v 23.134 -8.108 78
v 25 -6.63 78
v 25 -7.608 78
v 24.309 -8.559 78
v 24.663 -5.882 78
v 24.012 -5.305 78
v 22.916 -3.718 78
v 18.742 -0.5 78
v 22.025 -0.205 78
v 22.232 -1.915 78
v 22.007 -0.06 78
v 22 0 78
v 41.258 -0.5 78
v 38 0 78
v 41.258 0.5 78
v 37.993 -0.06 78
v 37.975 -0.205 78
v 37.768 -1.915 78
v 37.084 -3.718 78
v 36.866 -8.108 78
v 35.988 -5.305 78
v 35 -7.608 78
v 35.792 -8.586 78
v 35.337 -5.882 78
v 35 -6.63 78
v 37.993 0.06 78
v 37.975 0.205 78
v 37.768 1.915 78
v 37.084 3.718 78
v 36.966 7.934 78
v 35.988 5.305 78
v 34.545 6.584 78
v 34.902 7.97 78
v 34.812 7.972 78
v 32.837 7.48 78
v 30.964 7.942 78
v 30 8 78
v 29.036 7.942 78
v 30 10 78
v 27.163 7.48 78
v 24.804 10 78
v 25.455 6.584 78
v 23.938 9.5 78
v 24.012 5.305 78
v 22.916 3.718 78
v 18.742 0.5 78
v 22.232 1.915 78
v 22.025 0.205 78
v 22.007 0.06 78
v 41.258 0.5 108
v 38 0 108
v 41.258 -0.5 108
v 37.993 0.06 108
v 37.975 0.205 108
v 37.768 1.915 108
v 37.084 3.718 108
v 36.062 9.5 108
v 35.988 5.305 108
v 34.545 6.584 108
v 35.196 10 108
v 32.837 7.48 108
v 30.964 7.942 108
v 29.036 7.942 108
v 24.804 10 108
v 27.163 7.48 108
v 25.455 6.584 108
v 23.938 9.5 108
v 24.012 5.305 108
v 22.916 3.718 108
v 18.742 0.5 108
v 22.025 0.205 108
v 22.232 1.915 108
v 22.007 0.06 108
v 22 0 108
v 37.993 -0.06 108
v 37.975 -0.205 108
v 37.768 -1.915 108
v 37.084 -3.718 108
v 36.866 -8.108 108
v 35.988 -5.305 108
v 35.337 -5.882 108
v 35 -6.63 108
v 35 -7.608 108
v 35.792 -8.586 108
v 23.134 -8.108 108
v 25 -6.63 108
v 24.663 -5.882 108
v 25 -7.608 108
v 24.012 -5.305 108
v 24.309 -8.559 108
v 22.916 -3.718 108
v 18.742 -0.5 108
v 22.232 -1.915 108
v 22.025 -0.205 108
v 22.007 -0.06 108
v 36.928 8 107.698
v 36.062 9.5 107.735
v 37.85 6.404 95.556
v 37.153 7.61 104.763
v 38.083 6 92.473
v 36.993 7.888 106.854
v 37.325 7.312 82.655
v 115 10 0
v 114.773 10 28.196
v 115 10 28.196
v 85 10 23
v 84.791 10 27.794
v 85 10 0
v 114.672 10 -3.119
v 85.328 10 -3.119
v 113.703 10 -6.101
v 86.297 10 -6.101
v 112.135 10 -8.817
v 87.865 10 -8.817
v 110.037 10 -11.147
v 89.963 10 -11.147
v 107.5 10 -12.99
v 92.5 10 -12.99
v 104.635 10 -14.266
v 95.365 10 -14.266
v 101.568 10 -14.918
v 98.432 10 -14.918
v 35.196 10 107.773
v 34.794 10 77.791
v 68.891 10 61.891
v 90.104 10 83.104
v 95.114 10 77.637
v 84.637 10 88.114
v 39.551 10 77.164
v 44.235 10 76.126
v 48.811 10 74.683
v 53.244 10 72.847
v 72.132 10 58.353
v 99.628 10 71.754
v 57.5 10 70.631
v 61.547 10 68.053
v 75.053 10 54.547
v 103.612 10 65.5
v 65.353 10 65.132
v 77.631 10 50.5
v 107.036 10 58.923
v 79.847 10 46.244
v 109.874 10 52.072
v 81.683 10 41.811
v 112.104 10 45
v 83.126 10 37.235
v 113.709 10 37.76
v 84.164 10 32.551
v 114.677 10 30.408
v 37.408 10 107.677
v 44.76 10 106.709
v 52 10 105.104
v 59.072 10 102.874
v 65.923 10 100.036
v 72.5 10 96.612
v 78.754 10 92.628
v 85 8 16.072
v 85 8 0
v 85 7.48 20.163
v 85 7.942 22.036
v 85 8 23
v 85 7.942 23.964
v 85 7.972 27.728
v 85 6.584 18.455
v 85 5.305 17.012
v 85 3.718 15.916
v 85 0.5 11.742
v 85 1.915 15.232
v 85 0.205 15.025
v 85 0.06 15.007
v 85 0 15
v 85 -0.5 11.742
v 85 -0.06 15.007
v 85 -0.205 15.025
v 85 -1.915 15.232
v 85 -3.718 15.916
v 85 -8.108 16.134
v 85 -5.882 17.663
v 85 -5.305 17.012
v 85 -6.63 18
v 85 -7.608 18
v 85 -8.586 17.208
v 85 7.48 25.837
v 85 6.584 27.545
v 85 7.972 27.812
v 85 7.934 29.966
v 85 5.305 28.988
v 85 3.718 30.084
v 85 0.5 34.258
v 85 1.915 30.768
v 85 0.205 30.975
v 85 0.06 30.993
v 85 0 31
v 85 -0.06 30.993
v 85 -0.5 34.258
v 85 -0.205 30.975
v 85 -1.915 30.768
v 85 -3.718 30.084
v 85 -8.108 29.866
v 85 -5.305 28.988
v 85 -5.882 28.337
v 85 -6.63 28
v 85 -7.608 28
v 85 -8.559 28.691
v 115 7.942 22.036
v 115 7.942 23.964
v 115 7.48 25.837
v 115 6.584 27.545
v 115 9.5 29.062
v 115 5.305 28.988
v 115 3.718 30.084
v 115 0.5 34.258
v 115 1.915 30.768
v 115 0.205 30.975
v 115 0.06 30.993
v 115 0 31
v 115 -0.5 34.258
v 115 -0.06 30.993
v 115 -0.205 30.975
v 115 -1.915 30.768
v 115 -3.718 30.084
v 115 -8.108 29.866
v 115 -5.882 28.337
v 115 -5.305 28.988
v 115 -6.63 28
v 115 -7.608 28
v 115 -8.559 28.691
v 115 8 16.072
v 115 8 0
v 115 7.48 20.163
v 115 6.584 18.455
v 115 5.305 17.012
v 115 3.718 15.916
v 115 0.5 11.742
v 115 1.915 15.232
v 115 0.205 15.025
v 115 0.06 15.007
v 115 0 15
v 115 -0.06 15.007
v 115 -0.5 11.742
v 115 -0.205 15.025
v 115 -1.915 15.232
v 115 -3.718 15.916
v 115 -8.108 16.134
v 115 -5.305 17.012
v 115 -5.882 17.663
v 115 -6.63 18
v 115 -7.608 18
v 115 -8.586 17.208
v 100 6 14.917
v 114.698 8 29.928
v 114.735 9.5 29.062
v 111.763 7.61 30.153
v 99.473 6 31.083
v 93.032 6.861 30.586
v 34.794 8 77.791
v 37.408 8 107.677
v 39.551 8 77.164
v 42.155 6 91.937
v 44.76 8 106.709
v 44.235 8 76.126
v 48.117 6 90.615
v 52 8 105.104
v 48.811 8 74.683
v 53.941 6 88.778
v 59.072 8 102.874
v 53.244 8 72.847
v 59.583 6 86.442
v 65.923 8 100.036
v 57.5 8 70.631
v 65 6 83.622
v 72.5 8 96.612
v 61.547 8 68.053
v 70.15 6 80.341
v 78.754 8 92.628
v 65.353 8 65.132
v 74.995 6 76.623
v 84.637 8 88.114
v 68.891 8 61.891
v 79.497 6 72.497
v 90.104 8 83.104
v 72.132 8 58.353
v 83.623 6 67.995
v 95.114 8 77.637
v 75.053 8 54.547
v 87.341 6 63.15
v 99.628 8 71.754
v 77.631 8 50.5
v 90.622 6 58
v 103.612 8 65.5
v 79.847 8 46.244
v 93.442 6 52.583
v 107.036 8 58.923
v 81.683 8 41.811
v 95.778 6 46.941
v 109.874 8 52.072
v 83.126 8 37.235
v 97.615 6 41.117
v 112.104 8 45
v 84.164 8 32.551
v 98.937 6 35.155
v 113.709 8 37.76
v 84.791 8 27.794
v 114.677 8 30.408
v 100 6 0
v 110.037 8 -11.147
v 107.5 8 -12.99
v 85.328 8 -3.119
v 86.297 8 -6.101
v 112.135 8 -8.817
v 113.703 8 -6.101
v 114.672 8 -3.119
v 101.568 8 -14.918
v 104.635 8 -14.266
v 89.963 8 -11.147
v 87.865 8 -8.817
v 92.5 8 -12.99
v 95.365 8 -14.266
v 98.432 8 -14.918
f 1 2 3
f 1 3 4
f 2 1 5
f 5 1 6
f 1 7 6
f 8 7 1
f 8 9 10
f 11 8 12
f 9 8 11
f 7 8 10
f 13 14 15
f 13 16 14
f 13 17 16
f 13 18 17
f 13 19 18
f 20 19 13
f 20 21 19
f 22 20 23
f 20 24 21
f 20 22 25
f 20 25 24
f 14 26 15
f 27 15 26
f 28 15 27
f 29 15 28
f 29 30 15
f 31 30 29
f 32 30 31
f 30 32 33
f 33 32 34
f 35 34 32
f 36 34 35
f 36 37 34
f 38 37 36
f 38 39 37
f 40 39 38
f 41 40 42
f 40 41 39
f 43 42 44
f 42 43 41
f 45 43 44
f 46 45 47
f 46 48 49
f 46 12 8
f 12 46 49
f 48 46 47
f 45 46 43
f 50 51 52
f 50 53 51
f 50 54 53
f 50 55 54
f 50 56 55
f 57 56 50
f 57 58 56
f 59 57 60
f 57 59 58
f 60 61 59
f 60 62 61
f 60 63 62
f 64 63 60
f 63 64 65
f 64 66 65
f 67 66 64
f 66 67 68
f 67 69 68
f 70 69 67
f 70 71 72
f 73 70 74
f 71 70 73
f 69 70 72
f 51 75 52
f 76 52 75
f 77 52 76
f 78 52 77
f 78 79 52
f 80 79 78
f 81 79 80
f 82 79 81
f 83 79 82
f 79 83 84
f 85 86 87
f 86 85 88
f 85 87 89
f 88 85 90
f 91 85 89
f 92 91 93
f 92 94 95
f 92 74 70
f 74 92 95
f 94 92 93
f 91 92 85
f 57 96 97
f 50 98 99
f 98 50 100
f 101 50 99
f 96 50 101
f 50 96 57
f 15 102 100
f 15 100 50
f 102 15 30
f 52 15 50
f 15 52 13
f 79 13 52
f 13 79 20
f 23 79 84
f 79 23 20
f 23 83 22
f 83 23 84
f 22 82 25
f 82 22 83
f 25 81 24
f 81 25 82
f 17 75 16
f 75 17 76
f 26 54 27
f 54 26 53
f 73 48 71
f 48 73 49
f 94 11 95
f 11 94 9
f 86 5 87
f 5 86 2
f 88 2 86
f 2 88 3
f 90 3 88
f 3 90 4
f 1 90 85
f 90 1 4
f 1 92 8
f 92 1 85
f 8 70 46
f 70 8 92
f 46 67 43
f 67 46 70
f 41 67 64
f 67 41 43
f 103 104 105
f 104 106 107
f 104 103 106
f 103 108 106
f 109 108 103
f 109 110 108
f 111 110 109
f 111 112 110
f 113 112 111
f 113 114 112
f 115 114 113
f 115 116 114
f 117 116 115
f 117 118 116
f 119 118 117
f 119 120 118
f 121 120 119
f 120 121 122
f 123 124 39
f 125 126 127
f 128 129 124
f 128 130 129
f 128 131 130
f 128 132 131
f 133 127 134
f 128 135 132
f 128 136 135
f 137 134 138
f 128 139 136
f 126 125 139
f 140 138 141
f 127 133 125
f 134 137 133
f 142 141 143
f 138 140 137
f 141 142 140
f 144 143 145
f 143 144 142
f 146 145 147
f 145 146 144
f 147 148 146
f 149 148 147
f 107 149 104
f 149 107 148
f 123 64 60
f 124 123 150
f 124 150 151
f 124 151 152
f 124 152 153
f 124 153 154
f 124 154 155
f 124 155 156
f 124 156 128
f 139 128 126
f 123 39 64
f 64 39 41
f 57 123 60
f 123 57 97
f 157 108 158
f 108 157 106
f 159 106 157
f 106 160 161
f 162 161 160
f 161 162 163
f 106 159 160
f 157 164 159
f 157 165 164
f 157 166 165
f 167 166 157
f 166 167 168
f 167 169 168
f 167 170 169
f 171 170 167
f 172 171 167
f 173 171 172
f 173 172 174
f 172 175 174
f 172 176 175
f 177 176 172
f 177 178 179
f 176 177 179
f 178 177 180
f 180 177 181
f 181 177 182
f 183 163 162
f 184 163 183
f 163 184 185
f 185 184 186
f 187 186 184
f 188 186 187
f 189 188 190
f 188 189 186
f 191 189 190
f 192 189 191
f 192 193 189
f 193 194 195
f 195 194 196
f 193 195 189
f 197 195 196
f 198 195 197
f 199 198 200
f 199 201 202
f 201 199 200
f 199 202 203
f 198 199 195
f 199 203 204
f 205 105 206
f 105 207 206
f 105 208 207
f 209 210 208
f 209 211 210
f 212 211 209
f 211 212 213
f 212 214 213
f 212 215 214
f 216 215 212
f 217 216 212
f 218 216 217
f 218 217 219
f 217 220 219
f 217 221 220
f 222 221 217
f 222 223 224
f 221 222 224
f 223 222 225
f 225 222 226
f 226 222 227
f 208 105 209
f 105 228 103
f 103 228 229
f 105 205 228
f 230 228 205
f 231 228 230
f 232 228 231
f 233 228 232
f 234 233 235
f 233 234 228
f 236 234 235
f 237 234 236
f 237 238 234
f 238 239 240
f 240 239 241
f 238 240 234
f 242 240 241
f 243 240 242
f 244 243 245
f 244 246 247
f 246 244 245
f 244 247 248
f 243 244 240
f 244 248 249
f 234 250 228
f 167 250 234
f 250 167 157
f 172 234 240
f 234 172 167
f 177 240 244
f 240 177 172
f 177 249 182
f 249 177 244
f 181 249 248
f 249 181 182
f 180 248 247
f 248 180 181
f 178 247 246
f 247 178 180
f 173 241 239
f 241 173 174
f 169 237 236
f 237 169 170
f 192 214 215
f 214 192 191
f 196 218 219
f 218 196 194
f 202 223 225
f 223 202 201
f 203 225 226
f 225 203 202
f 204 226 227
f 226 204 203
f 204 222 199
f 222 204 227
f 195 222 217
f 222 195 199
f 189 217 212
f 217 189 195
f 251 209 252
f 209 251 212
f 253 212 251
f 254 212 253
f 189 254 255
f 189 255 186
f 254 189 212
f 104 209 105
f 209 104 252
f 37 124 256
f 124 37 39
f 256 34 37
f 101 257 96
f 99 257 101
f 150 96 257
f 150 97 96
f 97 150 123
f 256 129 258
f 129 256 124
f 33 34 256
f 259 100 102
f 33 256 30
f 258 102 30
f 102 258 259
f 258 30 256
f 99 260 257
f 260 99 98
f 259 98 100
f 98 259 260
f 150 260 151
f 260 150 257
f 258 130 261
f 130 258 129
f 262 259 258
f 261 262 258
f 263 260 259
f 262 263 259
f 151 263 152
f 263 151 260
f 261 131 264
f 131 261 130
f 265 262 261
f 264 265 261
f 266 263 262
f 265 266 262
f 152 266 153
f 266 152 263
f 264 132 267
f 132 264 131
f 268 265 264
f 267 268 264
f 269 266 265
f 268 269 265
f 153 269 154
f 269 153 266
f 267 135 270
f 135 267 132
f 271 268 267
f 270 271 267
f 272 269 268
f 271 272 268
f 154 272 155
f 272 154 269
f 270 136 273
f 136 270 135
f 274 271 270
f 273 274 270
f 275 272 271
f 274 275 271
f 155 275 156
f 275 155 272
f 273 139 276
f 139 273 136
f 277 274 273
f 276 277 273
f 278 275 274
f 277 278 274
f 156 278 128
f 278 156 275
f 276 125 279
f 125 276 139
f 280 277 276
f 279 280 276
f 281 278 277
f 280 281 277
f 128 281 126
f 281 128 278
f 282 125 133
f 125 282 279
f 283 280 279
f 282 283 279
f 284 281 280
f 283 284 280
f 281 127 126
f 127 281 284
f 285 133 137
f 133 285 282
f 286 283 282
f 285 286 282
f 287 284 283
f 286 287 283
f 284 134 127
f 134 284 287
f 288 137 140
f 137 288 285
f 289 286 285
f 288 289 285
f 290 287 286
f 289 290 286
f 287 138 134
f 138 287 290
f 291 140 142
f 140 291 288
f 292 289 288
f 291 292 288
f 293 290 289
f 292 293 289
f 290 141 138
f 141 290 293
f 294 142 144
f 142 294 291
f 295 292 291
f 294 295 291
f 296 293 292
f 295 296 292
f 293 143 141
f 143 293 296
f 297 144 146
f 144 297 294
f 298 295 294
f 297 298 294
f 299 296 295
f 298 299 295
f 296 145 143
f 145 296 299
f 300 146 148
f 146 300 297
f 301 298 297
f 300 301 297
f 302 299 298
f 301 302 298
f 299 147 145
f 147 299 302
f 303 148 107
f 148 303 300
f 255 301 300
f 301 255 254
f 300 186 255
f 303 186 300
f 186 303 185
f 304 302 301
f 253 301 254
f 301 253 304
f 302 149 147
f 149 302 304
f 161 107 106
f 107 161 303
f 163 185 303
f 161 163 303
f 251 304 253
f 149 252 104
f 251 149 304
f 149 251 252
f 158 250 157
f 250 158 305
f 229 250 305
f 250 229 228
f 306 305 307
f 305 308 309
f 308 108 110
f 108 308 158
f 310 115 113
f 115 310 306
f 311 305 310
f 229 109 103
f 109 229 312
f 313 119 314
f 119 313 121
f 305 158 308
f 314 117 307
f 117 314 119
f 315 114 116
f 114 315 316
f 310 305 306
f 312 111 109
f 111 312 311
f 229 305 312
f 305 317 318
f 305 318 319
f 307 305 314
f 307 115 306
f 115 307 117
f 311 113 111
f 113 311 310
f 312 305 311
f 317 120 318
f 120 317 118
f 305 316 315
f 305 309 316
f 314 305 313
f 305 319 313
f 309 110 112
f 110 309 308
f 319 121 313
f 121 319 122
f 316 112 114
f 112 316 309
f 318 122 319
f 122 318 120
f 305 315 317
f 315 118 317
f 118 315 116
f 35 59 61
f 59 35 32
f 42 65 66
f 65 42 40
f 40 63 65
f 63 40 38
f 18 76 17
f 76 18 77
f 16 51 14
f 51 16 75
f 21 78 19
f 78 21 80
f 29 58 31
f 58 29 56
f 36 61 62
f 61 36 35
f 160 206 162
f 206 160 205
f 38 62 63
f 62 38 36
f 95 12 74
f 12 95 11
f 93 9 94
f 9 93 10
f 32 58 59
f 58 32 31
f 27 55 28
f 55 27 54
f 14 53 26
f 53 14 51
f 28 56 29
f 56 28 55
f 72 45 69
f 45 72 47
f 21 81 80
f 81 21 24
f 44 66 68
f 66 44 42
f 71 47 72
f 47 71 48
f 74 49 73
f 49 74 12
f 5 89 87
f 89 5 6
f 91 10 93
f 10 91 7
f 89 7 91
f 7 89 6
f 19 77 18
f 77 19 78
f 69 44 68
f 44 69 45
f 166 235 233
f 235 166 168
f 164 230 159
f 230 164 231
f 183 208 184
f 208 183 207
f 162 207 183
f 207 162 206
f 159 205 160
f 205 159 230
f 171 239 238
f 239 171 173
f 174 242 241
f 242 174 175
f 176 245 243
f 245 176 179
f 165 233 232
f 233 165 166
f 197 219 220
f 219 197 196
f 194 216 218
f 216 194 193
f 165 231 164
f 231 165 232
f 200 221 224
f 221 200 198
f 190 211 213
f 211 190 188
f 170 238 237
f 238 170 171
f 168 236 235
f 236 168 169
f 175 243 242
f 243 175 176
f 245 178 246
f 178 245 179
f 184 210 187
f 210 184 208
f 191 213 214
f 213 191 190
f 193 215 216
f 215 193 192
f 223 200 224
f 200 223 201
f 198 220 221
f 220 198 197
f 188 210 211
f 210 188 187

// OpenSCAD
frame_r = 8;

frame_ext_bend_r = 62.7;
frame_int_bend_r = 45;

frame_gap_x = 14;
frame_gap_z = 7;

foot_clip_thickness = 2;
foot_clip_length = 30;
foot_clip_offset = 10;

foot_thickness = 4;
foot_length = 20;


/* ===== *
 * Frame *
 * ===== */

module frame_ext() {
    for (a = [0, 90])
    rotate([0, a, 0])
    translate([0, 0, frame_ext_bend_r])
    cylinder(h = 100, r = frame_r);

    translate([frame_ext_bend_r, 0, frame_ext_bend_r])
    rotate([90, 180, 0])
    rotate_extrude(angle = 90)
    translate([frame_ext_bend_r, 0])
    circle(frame_r);
}

module frame_int() {
    translate([
        frame_r * 2 + frame_gap_x,
        0,
        frame_r * 2 + frame_gap_z,
    ]) {
        for (a = [0, 90])
        rotate([0, a, 0])
        translate([0, 0, frame_int_bend_r])
        cylinder(h = 100, r = frame_r);

        translate([frame_int_bend_r, 0, frame_int_bend_r])
        rotate([90, 180, 0])
        rotate_extrude(angle = 90)
        translate([frame_int_bend_r, 0])
        circle(frame_r);
    }
}

module frame() {
    frame_ext();
    frame_int();
}


/* ==== *
 * Foot *
 * ==== */

module foot_clip_profile() {
    offset(+ foot_clip_thickness / 2)
    offset(- foot_clip_thickness / 2)
    difference() {
        r_hex = (frame_r + foot_clip_thickness) * 2 / sqrt(3);
        circle(r_hex, $fn = 6);

        circle(frame_r);

        translate([0, frame_r])
        square([frame_r * 5/4, frame_r * 2], center = true);
    }
}

module foot_clip() {
    linear_extrude(foot_clip_length)
    foot_clip_profile();
}

module foot_connector_profile() {
    polygon([
        [- foot_clip_length / 2, foot_clip_thickness],
        [0, foot_thickness],
        [foot_clip_length / 2, foot_clip_thickness],
        [foot_clip_length / 2, 0],
        [- foot_clip_length / 2, 0],
    ]);
}

module foot_end() {
    rotate([-90, 0, 0])
    rotate_extrude(angle = 180) {
        polygon([
            [0, foot_thickness],
            [foot_clip_length / 2, foot_clip_thickness],
            [foot_clip_length / 2, 0],
            [0, 0],
        ]);
    }
}

module foot_connector_ext() {
    $fn = 72;

    translate([0, - frame_r - foot_clip_thickness, 0])
    rotate([-90, -90, 0])
    rotate_extrude(angle = 90)
    translate([frame_ext_bend_r + foot_clip_offset + foot_clip_length / 2, 0])
    foot_connector_profile();
}

module foot_ext() {
    translate([
        0,
        0,
        frame_ext_bend_r + foot_clip_offset,
    ])
    foot_clip();

    translate([
        frame_ext_bend_r + foot_clip_offset,
        0,
        0,
    ])
    rotate([0, 90, 0])
    foot_clip();

    foot_connector_ext();

    translate([
        frame_ext_bend_r + foot_clip_offset + foot_clip_length / 2,
        - frame_r - foot_clip_thickness,
        0,
    ])
    foot_end();
}

module foot_connector_int() {
    $fn = 72;

    translate([0, - frame_r - foot_clip_thickness, 0])
    rotate([-90, -90, 0])
    rotate_extrude(angle = 90)
    translate([frame_int_bend_r + foot_clip_offset + foot_clip_length / 2, 0])
    foot_connector_profile();
}

module foot_int() {
    translate([
        frame_r * 2 + frame_gap_x,
        0,
        frame_r * 2 + frame_gap_z + frame_int_bend_r + foot_clip_offset,
    ])
    mirror([0, 1, 0])
    foot_clip();

    translate([
        frame_r * 2 + frame_gap_x + frame_int_bend_r + foot_clip_offset,
        0,
        frame_r * 2 + frame_gap_z,
    ])
    mirror([0, 1, 0])
    rotate([0, 90, 0])
    foot_clip();

    translate([
        frame_r * 2 + frame_gap_x,
        0,
        frame_r * 2 + frame_gap_z,
    ])
    mirror([0, 1, 0])
    foot_connector_int();

    translate([
        frame_r * 2 + frame_gap_x + frame_int_bend_r + foot_clip_offset + foot_clip_length / 2,
        frame_r + foot_clip_thickness,
        frame_r * 2 + frame_gap_z,
    ])
    mirror([0, 1, 0])
    mirror([0, 0, 1])
    linear_extrude(frame_r * 2 + frame_gap_z)
    foot_connector_profile();

    translate([
        frame_r * 2 + frame_gap_x + frame_int_bend_r + foot_clip_offset + foot_clip_length / 2,
        frame_r + foot_clip_thickness,
        0,
    ])
    mirror([0, 1, 0])
    foot_end();
}


/* ====== *
 * Render *
 * ====== */

%frame();

difference() {
    foot_ext();
    frame_ext();
}

!difference() {
    foot_int();
    frame_int();
}
